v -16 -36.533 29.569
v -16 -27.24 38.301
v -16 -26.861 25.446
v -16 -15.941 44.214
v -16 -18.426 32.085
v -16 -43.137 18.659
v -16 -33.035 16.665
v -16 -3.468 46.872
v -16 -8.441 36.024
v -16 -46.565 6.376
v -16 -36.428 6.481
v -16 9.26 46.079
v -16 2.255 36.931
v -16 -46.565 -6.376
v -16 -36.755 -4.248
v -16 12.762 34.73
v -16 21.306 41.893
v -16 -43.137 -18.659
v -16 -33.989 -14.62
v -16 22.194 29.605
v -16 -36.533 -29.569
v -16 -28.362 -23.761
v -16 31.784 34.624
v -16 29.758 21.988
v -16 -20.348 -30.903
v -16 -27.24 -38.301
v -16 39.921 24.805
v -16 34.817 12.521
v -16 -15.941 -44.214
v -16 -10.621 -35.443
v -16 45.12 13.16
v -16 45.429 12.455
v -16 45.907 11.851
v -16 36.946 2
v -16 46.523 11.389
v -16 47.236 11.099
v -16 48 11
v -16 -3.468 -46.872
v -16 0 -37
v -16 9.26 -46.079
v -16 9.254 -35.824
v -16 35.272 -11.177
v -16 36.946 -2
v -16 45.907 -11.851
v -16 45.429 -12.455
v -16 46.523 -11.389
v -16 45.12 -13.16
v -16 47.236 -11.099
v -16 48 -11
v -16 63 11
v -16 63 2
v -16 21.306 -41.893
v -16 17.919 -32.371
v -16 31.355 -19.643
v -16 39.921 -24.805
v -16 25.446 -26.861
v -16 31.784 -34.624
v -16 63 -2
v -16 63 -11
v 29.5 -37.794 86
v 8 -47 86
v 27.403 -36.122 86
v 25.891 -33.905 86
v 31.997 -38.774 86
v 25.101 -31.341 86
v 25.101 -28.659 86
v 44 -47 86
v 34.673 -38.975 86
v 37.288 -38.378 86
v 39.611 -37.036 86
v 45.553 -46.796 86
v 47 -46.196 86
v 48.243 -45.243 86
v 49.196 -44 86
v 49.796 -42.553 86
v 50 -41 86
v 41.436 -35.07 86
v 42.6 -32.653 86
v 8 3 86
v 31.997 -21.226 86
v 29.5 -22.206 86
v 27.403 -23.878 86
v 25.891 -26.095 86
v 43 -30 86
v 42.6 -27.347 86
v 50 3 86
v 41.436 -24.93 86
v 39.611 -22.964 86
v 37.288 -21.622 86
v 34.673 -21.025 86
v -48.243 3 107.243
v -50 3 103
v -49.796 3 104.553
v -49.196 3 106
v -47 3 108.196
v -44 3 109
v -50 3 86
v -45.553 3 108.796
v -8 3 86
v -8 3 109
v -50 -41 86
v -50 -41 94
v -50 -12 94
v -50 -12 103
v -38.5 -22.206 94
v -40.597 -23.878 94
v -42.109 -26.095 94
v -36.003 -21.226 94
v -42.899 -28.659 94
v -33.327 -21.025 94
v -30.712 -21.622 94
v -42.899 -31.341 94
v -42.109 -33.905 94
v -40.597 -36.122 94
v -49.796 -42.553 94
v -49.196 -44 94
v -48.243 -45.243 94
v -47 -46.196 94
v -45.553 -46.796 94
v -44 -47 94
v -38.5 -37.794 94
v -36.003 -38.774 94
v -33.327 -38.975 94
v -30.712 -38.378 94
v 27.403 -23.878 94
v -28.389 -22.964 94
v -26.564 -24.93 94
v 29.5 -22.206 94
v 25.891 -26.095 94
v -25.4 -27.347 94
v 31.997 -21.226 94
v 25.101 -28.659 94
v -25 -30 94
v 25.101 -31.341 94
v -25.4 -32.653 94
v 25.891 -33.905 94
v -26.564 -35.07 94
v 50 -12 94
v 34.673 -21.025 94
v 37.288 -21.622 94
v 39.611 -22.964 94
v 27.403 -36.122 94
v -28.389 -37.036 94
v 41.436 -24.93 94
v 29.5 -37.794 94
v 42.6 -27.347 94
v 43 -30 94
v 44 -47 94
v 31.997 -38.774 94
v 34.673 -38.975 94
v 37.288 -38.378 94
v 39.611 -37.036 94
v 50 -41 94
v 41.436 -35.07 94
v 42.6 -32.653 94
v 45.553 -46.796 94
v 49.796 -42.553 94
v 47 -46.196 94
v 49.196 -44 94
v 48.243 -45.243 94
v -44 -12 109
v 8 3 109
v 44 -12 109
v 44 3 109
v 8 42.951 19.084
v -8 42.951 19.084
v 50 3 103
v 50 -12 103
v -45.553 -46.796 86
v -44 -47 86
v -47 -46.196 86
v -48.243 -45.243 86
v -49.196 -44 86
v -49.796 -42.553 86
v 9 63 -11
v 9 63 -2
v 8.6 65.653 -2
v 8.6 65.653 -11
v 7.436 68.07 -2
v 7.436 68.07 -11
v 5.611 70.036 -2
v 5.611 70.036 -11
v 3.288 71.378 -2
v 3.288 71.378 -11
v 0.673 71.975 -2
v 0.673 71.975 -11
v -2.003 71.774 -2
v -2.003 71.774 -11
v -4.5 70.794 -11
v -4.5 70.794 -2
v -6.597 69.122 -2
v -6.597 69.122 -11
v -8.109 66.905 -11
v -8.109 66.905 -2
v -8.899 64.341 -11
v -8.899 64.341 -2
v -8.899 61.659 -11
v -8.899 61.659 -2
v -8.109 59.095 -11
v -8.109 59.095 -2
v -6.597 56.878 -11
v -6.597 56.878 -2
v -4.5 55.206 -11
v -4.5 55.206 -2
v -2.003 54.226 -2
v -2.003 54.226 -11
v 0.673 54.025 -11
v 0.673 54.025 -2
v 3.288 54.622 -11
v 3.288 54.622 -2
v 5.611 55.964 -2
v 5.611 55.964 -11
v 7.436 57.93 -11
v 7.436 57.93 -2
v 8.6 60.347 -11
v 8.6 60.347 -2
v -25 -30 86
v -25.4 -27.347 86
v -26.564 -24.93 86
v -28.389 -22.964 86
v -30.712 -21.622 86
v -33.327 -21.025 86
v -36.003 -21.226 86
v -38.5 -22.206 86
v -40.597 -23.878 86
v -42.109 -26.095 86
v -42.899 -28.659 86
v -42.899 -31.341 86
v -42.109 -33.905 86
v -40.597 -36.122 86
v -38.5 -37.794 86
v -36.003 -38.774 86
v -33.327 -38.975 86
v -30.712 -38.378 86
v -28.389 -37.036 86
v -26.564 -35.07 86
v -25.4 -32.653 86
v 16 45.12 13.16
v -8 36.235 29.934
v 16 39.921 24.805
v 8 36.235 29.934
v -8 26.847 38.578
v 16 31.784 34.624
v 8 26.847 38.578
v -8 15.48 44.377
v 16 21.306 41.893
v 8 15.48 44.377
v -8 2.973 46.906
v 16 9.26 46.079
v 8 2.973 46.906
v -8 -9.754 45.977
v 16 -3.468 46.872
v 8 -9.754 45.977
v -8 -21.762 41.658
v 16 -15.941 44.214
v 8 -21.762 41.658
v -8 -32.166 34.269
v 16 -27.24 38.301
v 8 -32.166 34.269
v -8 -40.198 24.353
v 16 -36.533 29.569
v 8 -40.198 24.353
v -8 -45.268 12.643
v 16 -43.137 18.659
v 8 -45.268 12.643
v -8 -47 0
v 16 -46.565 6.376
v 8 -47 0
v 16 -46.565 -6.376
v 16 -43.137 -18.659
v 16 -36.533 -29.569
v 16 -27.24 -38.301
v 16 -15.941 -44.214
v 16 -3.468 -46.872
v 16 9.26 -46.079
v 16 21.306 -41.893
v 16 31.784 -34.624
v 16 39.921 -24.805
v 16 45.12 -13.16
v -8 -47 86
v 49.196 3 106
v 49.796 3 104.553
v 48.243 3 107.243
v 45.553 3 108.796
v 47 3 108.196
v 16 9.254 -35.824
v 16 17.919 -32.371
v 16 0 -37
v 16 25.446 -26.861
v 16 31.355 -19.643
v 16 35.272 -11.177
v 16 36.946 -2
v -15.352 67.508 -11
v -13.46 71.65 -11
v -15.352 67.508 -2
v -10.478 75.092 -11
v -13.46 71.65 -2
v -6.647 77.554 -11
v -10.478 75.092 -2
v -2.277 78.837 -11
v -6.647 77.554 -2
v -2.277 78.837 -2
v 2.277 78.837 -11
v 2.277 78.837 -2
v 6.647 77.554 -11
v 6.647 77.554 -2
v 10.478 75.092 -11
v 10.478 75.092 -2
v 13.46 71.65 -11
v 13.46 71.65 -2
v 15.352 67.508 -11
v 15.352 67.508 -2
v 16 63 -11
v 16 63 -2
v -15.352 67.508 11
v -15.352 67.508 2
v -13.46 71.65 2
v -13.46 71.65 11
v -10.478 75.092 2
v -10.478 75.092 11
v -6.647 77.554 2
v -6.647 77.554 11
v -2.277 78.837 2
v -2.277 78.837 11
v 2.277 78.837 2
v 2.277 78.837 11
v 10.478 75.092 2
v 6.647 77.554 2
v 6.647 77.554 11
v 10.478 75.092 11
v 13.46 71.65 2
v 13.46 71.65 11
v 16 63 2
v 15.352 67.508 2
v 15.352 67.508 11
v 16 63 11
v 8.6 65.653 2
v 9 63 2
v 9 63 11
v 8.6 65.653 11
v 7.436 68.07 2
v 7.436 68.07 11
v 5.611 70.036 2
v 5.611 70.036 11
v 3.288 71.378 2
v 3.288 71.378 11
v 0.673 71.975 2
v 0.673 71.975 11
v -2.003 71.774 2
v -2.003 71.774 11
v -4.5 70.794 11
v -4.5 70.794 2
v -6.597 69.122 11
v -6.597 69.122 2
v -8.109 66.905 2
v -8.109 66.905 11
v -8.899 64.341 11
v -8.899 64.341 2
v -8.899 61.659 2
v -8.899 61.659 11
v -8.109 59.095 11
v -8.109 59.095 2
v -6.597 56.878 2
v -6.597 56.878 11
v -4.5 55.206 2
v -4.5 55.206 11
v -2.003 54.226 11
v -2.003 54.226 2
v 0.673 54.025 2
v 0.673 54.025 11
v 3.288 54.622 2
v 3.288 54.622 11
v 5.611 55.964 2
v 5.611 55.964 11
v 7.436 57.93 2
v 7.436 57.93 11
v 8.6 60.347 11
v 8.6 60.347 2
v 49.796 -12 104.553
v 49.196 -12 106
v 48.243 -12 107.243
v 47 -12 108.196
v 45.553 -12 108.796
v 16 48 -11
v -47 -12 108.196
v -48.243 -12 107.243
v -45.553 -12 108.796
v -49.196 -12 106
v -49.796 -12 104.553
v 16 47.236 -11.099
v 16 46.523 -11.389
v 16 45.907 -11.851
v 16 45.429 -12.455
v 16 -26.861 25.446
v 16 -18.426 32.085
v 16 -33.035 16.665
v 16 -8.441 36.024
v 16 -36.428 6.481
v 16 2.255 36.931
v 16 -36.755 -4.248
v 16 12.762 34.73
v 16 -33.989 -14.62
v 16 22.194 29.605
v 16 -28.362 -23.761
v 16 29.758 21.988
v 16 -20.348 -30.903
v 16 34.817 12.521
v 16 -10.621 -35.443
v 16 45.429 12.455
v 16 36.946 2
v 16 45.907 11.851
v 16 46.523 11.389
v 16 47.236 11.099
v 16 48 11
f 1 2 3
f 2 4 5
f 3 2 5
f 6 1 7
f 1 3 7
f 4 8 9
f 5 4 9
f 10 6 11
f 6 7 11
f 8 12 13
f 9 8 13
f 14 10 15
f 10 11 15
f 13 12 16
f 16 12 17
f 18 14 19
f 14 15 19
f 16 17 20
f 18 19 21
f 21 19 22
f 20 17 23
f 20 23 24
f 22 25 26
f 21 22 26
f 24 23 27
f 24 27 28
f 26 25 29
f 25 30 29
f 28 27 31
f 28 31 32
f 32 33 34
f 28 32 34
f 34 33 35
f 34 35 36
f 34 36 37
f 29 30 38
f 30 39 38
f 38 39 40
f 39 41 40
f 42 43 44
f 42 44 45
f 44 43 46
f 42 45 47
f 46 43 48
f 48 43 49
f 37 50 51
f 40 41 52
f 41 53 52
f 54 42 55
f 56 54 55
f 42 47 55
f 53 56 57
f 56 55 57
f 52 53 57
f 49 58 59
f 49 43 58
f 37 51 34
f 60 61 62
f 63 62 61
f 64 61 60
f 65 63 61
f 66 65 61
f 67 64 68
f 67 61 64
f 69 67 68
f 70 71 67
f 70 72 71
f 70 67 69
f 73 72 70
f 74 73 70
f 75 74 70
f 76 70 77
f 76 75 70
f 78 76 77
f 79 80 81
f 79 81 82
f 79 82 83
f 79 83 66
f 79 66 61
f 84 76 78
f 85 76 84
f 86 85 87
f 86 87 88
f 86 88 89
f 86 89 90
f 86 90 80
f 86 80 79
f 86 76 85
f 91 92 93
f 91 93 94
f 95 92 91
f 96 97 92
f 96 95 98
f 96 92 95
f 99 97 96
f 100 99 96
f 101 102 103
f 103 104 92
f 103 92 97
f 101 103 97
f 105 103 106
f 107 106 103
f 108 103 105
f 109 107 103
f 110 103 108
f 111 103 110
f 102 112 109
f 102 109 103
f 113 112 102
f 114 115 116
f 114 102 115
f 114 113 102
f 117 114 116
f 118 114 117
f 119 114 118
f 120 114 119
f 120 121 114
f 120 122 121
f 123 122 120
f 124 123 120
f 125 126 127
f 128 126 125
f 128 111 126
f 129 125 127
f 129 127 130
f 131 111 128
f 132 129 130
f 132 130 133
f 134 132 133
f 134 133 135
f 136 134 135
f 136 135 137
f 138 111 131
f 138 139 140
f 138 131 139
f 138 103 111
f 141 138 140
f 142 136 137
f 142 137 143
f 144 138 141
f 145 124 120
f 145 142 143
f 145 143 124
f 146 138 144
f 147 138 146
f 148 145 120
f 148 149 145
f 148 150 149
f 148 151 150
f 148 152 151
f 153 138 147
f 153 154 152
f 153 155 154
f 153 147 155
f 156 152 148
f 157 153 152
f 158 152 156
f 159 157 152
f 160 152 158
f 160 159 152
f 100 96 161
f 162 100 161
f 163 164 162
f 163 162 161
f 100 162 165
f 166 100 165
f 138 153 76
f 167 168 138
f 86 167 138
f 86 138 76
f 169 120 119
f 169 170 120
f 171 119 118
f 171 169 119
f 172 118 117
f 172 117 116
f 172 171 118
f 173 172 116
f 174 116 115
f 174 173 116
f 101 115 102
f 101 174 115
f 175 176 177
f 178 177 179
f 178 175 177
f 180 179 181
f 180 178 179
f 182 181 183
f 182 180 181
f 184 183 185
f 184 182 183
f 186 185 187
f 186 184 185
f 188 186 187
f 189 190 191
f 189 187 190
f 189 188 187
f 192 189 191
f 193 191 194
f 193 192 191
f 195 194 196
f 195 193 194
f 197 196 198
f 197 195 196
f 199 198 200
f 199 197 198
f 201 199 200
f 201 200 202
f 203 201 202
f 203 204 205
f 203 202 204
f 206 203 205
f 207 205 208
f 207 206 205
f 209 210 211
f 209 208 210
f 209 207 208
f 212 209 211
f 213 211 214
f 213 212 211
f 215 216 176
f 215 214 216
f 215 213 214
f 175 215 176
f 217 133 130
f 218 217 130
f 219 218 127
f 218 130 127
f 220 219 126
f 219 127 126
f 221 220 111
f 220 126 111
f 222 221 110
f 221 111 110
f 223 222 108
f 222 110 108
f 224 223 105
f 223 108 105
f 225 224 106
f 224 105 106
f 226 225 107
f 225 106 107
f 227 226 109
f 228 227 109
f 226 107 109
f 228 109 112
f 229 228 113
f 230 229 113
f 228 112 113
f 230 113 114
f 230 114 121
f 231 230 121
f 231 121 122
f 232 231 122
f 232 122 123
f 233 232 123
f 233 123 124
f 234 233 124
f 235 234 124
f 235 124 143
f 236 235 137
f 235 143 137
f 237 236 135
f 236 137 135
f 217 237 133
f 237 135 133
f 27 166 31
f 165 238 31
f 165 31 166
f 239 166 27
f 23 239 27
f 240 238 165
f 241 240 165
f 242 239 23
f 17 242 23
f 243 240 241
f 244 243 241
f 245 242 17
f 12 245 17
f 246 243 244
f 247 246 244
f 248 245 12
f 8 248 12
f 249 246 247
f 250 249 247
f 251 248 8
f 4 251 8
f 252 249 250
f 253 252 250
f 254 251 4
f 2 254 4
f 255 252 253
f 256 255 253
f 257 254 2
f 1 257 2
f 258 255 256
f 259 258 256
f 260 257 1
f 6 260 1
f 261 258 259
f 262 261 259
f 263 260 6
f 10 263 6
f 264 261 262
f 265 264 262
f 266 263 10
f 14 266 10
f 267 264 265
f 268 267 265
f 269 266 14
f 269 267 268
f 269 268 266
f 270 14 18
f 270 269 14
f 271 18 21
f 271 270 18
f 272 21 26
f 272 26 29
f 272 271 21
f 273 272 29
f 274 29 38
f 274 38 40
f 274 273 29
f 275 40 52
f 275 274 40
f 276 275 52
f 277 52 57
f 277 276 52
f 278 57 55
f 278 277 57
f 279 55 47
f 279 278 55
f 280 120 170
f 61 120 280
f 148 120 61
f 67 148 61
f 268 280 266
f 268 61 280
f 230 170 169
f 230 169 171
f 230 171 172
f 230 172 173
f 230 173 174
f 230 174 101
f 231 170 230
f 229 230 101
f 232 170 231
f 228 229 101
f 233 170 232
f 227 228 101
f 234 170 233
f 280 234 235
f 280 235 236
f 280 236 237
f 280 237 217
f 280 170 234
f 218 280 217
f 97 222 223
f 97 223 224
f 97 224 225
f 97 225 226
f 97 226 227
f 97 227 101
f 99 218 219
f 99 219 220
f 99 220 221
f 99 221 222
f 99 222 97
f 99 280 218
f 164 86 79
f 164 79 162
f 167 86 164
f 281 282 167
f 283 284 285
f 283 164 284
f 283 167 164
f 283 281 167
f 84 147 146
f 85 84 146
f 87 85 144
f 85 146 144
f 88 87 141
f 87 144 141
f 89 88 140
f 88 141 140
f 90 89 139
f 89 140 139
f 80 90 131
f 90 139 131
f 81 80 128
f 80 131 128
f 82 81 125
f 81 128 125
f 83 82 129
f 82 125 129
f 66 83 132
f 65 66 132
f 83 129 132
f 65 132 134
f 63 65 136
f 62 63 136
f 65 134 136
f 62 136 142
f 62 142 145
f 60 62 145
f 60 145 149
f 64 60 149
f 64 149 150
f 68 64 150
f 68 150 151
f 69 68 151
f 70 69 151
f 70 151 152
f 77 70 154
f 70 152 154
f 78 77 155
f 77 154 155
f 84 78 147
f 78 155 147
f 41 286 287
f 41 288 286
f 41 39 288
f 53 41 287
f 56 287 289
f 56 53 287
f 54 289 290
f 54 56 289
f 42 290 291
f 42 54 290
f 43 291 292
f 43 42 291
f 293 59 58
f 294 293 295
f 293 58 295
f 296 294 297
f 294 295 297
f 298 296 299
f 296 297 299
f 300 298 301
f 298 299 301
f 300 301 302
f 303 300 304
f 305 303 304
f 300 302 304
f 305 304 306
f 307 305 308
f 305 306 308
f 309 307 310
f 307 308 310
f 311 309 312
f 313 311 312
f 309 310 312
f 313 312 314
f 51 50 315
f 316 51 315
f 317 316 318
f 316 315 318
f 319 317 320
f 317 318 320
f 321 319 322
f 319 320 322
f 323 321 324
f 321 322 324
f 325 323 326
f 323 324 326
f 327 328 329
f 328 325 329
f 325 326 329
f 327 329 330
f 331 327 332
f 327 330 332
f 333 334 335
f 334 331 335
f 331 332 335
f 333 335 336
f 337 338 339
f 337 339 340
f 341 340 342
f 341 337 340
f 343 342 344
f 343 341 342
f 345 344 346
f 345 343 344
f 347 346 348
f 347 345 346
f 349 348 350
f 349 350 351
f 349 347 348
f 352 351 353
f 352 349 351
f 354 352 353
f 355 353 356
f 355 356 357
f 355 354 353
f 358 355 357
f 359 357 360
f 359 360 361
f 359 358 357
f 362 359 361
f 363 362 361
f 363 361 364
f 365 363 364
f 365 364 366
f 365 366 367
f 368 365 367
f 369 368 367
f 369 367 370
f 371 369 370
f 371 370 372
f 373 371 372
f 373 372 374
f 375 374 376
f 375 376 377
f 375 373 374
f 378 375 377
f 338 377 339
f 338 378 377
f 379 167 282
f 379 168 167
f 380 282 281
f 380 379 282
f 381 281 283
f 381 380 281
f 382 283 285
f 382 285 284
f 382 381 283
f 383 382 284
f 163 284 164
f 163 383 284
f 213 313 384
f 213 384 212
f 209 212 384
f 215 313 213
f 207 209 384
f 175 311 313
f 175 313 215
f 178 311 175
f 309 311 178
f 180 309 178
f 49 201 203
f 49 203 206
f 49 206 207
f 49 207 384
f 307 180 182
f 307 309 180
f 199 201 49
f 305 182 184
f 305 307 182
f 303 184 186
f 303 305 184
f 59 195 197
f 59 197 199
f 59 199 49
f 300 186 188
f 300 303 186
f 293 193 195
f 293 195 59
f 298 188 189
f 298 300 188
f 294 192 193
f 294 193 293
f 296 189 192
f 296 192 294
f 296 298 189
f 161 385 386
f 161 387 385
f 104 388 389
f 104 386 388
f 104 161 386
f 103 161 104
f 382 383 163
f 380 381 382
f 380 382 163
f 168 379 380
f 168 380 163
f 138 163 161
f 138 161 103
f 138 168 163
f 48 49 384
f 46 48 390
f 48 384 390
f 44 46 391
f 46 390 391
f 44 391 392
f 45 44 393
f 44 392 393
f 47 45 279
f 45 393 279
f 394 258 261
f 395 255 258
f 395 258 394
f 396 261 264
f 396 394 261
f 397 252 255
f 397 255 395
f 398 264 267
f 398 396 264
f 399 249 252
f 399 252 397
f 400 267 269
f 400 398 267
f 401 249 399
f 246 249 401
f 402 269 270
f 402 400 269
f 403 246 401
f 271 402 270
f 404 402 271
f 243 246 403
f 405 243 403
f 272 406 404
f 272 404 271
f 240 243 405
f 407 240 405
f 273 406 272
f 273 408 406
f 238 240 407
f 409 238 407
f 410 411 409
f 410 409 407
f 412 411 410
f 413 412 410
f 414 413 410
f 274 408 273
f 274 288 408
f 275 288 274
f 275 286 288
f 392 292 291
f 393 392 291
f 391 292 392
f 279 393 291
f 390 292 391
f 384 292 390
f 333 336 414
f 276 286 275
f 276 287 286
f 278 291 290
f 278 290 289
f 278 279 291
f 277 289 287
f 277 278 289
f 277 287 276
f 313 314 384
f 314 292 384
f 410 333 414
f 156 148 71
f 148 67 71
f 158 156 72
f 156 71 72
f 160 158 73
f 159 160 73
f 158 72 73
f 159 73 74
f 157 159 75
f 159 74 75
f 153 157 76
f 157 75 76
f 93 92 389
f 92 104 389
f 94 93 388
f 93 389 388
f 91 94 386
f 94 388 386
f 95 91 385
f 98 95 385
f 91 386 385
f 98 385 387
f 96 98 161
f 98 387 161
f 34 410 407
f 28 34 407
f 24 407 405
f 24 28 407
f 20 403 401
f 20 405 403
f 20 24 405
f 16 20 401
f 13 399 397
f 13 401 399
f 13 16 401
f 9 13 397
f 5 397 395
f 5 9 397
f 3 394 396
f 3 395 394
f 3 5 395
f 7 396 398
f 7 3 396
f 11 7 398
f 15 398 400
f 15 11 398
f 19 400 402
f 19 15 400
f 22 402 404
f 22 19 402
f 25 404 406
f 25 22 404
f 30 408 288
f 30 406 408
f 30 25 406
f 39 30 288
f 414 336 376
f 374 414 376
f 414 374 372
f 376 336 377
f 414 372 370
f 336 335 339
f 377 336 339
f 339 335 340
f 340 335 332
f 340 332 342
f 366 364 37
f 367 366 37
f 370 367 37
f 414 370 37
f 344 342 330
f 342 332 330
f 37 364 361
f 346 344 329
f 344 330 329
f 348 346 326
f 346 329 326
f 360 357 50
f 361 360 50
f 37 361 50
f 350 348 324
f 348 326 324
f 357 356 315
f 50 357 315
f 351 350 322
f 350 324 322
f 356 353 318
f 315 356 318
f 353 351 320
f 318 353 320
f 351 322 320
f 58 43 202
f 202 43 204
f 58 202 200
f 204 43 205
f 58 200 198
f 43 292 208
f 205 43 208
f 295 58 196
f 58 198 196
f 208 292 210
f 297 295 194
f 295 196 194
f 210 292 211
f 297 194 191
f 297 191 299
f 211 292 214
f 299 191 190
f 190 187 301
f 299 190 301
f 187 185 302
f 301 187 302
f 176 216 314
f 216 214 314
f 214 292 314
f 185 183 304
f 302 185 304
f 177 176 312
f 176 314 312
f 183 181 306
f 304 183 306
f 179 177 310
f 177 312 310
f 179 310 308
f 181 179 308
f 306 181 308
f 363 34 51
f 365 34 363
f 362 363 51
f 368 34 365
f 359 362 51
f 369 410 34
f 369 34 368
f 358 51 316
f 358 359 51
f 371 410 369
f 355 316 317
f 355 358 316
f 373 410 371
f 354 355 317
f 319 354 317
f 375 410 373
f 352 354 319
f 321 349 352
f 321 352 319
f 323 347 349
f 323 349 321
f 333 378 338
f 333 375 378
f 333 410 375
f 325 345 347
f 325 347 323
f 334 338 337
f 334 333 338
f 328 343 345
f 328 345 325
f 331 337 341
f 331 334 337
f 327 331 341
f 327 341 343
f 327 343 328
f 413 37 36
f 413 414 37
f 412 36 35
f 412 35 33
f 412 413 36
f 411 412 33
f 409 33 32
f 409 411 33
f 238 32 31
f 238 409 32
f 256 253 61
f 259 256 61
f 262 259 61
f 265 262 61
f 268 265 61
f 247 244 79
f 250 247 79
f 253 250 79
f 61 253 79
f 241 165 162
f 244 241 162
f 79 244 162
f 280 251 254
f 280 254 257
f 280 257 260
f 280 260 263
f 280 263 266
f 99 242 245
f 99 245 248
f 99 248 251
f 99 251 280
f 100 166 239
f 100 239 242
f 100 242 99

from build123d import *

# Parameters (mm, degrees)
SKETCH_2_R             = 47
SKETCH_2_R_2           = 37
EXTRUDE_579_DEPTH      = 16
SKETCH_3_R             = 9
EXTRUDE_773_DEPTH      = 11
SKETCH_6_W             = 4
SKETCH_6_H             = 45
CUT_EXTRUDE_1_DEPTH    = 16
FILLET_1_R             = 3
EXTRUDE_1292_DEPTH     = 50
SKETCH_18_R            = 9
CUT_EXTRUDE_1513_DEPTH = 8
FILLET_3_R             = 6
EXTRUDE_1878_DEPTH     = 8


with BuildPart() as part:
    # 草圖2 → Extrude 579 (new, symmetric)
    with BuildSketch(Plane(origin=(0, 0, 0), x_dir=(0, 0, -1), z_dir=(1, 0, 0))):
        Circle(SKETCH_2_R)
        Circle(SKETCH_2_R_2, mode=Mode.SUBTRACT)
    extrude(amount=EXTRUDE_579_DEPTH, both=True)

    # 草圖3 → Extrude 773 (add, symmetric)
    with BuildSketch(Plane.XY):
        with BuildLine():
            Line((16, 37), (-16, 37))
            Line((-16, 37), (-16, 63))
            ThreePointArc((-16, 63), (0, 79), (16, 63))
            Line((16, 63), (16, 37))
        make_face()
        with Locations((0, 63)):
            Circle(SKETCH_3_R, mode=Mode.SUBTRACT)
    extrude(amount=EXTRUDE_773_DEPTH, both=True)

    # 草圖6 → 除料-伸長1 (cut, symmetric)
    with BuildSketch(Plane(origin=(0, 0, 0), x_dir=(0, 0, -1), z_dir=(1, 0, 0))):
        with Locations((0, 59.445906404)):
            Rectangle(SKETCH_6_W, SKETCH_6_H)
    extrude(amount=CUT_EXTRUDE_1_DEPTH, both=True, mode=Mode.SUBTRACT)

    # 圓角1
    fillet_1_edges = [part.edges().sort_by_distance(p)[0] for p in [
        (0, 45.694638635, -11),
        (0, 45.694638635, 11),
    ]]
    fillet(fillet_1_edges, radius=FILLET_1_R)



with BuildPart() as body_2:
    # 草圖14 → Extrude 1292 (new, symmetric)
    with BuildSketch(Plane(origin=(0, 0, 0), x_dir=(0, 0, -1), z_dir=(1, 0, 0))):
        Polygon((-94, -47), (-86, -47), (-86, 3), (-109, 3), (-109, -12), (-94, -12), align=None)
    extrude(amount=EXTRUDE_1292_DEPTH, both=True)

    # 草圖18 → Cut-Extrude 1513 (cut)
    with BuildSketch(Plane.XY.offset(94)):
        with Locations((-34, -30)):
            Circle(SKETCH_18_R)
        with Locations((34, -30)):
            Circle(SKETCH_18_R)
    extrude(amount=-CUT_EXTRUDE_1513_DEPTH, mode=Mode.SUBTRACT)

    # 圓角3
    fillet_3_edges = [body_2.edges().sort_by_distance(p)[0] for p in [
        (50, -4.5, 109),
        (-50, -4.5, 109),
        (50, -47, 90),
        (-50, -47, 90),
    ]]
    fillet(fillet_3_edges, radius=FILLET_3_R)


with BuildPart() as part_1:
    add(part.part)

    add(body_2.part)  # Extrude 1878 merges body 2
    # 草圖20 → Extrude 1878 (add, symmetric)
    with BuildSketch(Plane(origin=(0, 0, 0), x_dir=(0, 0, -1), z_dir=(1, 0, 0))):
        with BuildLine():
            Line((-109, 3), (-19.083912356, 42.951184957))
            ThreePointArc((-19.083912356, 42.951184957), (-45.976655465, -9.754340243), (0, -47))
            Line((0, -47), (-86, -47))
            Line((-86, -47), (-86, 3))
            Line((-86, 3), (-109, 3))
        make_face()
    extrude(amount=EXTRUDE_1878_DEPTH, both=True)


solid = part_1.part
